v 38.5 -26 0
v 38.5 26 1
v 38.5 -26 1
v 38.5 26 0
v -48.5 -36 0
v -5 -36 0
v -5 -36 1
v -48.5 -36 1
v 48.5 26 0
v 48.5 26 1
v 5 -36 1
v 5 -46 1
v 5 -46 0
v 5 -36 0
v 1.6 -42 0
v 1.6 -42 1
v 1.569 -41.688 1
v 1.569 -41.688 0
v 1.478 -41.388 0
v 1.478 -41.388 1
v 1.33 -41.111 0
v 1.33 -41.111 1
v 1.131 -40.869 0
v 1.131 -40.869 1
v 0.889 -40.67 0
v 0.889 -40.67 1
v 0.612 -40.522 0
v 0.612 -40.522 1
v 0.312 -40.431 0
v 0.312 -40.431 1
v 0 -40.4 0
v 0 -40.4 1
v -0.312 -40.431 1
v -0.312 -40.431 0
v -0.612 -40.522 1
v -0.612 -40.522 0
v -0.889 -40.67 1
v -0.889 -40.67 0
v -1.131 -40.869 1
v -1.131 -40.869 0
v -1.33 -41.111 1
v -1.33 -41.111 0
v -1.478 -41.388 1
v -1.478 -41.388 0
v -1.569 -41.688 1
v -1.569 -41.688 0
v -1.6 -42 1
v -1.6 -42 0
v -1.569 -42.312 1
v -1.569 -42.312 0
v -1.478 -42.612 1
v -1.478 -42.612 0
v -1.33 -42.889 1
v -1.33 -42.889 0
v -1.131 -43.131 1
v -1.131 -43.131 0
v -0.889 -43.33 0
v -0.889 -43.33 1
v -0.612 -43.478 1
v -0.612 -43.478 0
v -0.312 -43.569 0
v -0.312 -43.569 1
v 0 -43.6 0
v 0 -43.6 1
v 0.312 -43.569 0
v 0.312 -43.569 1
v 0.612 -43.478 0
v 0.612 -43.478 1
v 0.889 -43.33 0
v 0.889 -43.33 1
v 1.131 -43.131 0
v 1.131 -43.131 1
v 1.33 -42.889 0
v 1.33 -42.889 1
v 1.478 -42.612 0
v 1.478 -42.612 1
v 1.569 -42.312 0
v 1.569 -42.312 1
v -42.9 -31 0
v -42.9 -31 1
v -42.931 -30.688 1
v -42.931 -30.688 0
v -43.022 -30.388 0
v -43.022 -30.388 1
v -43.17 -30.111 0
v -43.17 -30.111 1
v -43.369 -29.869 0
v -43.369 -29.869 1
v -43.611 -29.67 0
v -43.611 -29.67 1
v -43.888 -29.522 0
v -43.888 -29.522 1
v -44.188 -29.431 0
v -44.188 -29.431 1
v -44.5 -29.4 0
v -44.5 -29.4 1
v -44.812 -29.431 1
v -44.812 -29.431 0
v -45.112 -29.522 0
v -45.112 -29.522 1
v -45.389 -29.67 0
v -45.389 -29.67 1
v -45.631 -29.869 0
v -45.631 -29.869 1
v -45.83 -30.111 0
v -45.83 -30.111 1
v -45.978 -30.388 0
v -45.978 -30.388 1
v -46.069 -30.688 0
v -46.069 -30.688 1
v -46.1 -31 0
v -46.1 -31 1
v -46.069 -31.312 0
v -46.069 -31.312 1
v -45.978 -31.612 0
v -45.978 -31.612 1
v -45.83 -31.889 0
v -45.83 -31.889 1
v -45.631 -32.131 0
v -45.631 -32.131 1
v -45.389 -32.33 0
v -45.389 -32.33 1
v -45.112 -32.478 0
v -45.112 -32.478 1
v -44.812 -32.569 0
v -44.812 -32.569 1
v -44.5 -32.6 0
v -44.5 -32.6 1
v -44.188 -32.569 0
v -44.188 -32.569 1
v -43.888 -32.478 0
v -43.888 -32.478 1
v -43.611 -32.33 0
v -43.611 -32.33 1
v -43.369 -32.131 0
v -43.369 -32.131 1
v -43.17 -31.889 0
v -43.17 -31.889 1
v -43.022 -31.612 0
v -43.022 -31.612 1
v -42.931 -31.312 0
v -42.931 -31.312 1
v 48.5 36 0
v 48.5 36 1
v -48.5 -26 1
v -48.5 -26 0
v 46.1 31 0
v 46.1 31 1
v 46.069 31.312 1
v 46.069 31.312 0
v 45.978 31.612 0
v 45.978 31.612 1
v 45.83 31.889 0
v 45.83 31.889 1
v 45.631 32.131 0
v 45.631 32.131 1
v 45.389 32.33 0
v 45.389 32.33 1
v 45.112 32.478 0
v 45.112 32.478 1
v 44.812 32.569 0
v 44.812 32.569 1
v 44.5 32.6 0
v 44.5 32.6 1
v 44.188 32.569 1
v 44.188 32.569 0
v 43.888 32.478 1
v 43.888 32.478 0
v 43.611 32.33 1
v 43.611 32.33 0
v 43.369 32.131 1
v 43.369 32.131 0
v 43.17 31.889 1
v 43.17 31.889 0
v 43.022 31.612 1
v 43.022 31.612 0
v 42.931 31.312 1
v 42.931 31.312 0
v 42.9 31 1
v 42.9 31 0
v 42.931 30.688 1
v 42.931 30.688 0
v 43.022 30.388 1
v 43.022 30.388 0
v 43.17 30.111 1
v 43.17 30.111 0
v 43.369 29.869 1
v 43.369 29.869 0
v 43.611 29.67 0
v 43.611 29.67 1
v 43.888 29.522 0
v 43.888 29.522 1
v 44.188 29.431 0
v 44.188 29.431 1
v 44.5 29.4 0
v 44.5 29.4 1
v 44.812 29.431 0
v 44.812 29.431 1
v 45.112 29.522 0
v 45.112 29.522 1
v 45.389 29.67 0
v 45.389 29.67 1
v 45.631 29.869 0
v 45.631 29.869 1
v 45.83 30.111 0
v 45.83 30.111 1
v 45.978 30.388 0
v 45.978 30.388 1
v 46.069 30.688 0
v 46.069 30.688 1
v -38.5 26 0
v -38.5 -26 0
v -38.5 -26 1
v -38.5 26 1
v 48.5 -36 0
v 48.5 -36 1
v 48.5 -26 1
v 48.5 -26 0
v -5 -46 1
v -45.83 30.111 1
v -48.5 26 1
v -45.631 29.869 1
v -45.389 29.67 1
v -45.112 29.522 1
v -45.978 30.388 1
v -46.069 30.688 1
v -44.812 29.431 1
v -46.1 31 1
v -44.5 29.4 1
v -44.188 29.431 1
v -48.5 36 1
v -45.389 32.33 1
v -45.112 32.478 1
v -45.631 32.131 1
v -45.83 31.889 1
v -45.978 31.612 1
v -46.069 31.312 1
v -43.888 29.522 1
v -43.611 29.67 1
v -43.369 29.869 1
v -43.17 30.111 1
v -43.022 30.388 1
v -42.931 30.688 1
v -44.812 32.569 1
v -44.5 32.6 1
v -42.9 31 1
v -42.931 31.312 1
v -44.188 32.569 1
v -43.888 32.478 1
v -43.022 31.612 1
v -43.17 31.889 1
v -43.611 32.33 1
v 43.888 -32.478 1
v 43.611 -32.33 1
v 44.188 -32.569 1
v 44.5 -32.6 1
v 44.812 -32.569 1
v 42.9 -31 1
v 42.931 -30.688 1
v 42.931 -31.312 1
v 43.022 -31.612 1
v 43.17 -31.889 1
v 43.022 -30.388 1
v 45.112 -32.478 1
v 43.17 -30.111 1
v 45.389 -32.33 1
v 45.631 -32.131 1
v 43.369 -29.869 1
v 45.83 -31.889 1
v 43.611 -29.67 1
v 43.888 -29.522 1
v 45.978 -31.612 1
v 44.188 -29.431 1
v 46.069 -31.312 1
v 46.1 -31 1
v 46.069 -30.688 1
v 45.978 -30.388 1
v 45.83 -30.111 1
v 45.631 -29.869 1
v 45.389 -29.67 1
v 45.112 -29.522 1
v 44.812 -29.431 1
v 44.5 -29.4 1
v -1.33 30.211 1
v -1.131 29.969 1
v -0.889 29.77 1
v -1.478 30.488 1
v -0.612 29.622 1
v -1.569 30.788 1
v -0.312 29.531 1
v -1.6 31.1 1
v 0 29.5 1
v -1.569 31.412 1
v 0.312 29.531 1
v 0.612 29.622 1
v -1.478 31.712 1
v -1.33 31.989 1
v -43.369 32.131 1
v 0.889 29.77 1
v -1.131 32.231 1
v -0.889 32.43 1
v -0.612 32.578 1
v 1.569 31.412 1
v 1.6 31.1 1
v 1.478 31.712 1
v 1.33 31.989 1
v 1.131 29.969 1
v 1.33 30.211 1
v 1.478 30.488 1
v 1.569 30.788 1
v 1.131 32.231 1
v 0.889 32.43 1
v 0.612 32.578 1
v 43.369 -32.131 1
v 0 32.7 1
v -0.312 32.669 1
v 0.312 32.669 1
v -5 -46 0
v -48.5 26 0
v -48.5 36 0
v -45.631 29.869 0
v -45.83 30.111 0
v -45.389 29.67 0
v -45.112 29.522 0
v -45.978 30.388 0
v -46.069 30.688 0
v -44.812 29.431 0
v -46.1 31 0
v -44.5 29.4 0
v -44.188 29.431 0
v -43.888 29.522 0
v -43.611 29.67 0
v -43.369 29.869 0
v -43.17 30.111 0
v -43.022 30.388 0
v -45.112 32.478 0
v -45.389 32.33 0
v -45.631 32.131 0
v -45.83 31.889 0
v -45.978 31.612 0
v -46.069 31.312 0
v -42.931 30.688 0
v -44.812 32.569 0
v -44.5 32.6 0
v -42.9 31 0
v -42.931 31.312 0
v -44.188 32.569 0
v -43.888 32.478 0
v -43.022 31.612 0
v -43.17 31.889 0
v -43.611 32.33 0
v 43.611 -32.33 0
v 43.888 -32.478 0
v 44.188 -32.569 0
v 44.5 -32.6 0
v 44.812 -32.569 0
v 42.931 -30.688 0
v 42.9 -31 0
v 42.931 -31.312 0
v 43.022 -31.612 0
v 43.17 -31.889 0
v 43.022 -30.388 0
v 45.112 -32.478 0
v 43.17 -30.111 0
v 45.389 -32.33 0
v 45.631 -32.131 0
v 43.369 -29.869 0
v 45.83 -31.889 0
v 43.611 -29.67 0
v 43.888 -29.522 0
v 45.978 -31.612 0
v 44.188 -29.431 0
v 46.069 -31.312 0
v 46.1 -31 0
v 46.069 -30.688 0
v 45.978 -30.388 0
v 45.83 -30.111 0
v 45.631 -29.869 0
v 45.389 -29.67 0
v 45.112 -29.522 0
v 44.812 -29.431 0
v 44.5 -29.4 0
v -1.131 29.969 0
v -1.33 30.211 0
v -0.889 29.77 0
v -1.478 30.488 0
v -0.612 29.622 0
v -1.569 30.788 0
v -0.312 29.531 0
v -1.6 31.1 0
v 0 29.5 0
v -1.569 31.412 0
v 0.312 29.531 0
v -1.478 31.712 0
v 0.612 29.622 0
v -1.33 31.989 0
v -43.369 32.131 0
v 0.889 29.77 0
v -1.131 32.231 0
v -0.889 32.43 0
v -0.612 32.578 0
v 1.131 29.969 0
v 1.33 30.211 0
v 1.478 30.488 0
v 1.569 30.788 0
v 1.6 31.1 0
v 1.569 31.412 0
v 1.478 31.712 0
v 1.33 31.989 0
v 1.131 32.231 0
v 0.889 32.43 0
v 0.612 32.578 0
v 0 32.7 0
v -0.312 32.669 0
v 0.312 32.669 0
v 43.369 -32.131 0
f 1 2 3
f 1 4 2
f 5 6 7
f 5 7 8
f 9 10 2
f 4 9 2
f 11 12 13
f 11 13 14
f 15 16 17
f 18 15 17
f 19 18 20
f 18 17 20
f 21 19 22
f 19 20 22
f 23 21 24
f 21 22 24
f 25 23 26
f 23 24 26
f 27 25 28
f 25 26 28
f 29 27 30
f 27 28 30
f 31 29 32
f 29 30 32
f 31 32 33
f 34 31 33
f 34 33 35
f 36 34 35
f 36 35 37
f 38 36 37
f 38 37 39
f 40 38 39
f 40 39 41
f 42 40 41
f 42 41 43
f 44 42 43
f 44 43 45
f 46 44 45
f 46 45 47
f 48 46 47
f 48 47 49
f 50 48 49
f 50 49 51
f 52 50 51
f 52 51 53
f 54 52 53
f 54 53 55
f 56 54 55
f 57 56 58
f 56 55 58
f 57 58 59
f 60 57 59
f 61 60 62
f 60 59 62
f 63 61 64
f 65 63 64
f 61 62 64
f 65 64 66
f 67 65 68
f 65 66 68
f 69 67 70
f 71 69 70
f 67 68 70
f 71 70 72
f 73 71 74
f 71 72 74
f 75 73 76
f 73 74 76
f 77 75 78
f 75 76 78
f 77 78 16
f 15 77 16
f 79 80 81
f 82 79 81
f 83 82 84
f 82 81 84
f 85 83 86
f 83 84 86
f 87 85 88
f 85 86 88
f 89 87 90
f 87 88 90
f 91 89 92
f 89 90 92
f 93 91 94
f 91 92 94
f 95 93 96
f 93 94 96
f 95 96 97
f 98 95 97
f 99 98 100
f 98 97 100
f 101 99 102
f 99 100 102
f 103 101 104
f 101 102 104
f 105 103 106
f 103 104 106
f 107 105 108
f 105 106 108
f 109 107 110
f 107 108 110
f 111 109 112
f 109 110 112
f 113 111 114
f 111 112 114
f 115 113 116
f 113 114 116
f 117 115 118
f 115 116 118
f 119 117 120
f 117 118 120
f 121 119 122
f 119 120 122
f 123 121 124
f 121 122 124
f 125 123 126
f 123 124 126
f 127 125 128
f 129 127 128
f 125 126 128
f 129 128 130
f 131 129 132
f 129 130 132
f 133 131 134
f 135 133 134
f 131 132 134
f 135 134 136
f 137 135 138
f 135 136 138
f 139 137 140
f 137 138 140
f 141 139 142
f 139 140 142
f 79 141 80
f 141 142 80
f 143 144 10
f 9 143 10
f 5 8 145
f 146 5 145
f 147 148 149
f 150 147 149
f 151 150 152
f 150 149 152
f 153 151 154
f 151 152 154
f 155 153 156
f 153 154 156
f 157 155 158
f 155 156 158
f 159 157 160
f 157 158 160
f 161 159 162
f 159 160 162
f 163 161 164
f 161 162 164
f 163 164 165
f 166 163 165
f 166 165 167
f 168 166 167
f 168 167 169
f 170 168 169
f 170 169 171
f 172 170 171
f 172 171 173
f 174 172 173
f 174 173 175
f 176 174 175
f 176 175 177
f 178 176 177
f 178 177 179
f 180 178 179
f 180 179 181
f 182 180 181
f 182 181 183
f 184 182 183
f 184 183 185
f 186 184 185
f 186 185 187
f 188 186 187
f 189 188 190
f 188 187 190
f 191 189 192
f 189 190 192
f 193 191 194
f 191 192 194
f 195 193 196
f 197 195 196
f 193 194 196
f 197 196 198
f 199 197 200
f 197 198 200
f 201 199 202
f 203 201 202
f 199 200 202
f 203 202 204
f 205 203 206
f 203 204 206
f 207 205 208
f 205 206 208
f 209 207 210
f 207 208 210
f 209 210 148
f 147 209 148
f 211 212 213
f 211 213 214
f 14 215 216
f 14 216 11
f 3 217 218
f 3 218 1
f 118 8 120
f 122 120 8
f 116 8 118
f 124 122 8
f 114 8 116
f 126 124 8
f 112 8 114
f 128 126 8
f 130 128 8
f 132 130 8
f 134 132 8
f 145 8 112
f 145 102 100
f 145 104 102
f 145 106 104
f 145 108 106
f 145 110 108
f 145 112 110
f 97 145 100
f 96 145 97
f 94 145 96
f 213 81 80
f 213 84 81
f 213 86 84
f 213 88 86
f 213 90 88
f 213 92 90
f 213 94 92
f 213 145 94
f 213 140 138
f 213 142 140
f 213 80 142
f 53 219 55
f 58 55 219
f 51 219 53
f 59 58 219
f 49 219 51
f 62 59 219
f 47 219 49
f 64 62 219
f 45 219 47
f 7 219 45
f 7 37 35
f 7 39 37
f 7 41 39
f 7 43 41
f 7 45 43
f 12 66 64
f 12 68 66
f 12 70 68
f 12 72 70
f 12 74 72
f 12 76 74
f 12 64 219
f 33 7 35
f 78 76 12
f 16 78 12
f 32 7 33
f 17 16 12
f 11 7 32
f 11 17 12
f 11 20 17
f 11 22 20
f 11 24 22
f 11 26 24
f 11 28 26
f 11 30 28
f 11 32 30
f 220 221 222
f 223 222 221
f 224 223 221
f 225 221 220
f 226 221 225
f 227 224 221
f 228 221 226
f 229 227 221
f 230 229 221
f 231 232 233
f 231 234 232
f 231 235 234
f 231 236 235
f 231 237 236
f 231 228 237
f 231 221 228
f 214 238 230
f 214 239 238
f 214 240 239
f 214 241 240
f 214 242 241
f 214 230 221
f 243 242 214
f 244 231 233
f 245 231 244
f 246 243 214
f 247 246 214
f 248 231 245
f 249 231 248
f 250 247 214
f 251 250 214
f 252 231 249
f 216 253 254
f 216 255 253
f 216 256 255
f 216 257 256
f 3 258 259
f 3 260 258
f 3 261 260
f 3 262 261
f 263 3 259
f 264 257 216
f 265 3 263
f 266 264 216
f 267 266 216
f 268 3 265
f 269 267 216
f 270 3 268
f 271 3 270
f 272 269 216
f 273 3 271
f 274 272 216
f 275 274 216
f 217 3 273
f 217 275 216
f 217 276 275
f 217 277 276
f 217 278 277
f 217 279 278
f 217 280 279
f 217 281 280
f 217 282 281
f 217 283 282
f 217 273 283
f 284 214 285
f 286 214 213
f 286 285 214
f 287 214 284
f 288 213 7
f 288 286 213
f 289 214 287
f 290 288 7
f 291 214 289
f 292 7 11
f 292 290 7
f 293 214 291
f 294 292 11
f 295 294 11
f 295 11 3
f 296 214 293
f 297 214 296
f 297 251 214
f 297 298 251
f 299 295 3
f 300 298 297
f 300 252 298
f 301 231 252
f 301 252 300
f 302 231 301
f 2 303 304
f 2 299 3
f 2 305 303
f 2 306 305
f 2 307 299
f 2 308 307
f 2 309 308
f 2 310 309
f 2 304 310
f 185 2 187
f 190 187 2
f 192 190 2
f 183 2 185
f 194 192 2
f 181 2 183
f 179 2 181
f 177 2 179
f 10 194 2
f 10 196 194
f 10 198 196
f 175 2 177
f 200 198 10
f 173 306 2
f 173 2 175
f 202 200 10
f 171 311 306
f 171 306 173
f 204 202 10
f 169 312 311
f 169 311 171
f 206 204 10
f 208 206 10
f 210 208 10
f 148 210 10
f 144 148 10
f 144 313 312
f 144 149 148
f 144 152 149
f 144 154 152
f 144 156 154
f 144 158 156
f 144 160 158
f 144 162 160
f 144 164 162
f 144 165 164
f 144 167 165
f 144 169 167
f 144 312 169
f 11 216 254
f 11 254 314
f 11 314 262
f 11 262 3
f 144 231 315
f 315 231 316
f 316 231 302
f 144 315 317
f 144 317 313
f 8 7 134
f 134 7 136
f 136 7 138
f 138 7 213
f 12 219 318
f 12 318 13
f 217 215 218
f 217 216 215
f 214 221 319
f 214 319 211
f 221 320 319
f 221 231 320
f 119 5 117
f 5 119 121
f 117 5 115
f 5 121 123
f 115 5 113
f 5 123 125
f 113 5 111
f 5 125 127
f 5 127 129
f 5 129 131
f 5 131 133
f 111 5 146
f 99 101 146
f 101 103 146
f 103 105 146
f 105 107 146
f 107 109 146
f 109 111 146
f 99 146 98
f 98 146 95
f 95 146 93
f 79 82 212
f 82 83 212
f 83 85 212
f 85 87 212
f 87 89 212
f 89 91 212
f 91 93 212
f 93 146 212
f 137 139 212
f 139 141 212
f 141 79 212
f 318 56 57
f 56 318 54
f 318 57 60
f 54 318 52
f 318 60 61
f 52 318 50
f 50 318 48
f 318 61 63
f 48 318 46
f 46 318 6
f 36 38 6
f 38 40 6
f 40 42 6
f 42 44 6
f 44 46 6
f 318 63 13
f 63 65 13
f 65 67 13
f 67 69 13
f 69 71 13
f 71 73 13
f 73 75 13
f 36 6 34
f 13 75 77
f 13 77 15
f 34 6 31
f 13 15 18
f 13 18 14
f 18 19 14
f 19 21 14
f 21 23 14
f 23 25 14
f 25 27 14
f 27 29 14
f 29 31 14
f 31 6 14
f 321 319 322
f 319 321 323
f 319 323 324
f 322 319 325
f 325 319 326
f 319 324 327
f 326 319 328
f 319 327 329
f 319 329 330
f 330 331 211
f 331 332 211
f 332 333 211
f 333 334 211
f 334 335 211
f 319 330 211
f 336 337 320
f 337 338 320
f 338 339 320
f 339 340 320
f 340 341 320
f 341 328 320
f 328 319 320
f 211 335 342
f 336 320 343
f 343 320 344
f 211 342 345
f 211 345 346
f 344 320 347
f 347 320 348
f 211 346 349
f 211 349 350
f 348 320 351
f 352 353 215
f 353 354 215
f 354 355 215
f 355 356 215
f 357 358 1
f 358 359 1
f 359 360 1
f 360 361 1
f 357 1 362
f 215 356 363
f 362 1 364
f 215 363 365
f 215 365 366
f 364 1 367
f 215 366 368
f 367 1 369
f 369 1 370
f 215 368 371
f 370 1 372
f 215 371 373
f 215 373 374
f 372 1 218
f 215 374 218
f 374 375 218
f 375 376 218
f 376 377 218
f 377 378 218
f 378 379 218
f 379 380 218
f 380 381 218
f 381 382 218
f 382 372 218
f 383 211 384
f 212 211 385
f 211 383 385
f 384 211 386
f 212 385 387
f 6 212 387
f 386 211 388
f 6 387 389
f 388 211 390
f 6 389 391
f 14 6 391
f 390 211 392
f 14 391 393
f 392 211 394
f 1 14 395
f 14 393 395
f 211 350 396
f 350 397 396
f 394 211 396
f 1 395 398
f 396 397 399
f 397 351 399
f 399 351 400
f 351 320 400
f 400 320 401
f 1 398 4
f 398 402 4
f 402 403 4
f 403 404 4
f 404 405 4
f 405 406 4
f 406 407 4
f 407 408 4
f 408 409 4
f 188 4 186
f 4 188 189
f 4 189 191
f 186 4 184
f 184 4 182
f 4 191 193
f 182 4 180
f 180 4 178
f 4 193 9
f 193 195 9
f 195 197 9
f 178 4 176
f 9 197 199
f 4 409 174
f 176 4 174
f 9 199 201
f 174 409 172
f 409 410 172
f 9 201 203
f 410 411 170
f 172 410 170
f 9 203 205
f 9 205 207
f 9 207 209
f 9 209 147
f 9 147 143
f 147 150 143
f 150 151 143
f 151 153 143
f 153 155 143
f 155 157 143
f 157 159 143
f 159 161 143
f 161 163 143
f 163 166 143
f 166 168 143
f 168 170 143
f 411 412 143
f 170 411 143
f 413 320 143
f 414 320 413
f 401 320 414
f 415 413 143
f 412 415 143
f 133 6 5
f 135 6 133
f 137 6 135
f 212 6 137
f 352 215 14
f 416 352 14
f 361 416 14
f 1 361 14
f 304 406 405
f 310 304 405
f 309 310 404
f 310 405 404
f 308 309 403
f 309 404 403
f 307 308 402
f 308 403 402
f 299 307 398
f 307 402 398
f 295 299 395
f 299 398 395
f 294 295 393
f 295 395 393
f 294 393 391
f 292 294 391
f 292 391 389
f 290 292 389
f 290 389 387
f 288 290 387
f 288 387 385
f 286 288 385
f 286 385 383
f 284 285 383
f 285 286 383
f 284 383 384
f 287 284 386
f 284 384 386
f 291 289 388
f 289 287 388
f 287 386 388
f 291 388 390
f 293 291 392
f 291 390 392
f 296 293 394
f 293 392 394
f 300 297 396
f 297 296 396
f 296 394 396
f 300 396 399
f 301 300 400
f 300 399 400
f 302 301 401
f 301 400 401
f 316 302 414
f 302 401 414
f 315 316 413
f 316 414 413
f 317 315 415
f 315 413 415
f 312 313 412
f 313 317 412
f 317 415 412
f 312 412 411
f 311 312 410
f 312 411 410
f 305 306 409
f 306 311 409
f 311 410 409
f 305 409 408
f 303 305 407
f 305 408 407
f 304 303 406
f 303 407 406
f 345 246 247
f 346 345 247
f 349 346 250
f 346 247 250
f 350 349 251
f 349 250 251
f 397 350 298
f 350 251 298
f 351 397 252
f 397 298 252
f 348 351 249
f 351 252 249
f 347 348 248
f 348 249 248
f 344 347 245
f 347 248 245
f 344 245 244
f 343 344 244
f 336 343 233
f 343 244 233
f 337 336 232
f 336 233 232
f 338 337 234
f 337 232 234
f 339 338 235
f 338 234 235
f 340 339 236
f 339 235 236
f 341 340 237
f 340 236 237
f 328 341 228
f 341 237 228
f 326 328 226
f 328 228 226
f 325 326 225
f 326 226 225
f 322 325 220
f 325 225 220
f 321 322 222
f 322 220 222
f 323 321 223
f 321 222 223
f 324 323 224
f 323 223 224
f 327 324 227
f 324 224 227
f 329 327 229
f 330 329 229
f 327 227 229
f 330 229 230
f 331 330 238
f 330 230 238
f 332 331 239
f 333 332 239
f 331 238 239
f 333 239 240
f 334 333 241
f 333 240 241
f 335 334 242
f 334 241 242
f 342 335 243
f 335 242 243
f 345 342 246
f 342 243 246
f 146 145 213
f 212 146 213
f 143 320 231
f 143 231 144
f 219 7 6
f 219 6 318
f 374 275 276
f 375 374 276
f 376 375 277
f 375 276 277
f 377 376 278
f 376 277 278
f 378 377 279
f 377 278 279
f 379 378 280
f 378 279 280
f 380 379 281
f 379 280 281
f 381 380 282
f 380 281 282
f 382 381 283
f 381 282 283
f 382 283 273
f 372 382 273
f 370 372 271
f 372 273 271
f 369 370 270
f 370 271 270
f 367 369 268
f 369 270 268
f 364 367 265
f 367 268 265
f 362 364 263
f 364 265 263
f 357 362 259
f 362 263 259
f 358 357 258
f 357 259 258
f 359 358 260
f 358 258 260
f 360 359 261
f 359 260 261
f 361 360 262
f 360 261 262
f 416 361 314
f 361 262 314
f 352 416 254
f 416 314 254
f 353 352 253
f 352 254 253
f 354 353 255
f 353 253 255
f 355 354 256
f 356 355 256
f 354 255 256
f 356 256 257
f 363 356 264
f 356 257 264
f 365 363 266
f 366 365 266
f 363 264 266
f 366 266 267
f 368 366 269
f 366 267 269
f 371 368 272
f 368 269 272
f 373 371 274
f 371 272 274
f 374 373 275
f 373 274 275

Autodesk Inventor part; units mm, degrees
ref_plane "YZ Plane" through (0, 0, 0) normal (1, 0, 0) x (0, 1, 0)
ref_plane "XZ Plane" through (0, 0, 0) normal (0, 1, 0) x (-1, 0, 0)
ref_plane "XY Plane" through (0, 0, 0) normal (0, 0, 1) x (1, 0, 0)
sketch "Sketch1" plane through (0, 0, 0) normal (0, 0, 1) x (1, 0, 0)
  line L0 (-38.5, 36) -> (38.5, 36)
  line L1 (38.5, 36) -> (38.5, -36)
  line L2 (38.5, -36) -> (-38.5, -36)
  line L3 (-38.5, -36) -> (-38.5, 36)
  line L4 (-38.5, 36) -> (38.5, -36) construction
  line L5 (38.5, 36) -> (-38.5, -36) construction
  circle A0 centre (0, 31.1) radius 1.6
  point P0 (0, 0)
  dimension "d0" = 72
  dimension "d1" = 77
  dimension "d24" = 3.2
  dimension "d25" = 4.9
sketch "Sketch2" plane through (0, 0, 1) normal (0, 0, 1) x (1, 0, 0)
  line L0 (-38.5, 36) -> (38.5, 36)
  line L1 (-48.5, 26) -> (-38.5, 26)
  line L2 (-38.5, 26) -> (-38.5, 36)
  line L3 (-38.5, 36) -> (-48.5, 36)
  line L4 (-48.5, 36) -> (-48.5, 26)
  line L5 (-48.5, 26) -> (-38.5, 36) construction
  line L6 (-38.5, 26) -> (-48.5, 36) construction
  line L7 (0, 0) -> (0, 7.0571)
  line L8 (0, 0) -> (6.6312, 0)
  line L9 (-38.5, -36) -> (-38.5, 36)
  line L10 (48.5, 26) -> (38.5, 26)
  line L11 (38.5, 26) -> (38.5, 36)
  line L12 (38.5, 36) -> (48.5, 36)
  line L13 (48.5, 36) -> (48.5, 26)
  line L14 (48.5, 26) -> (38.5, 36) construction
  line L15 (38.5, 26) -> (48.5, 36) construction
  circle A0 centre (-44.5, 31) radius 1.6
  circle A1 centre (44.5, 31) radius 1.6
  line L16 (38.5, -36) -> (-38.5, -36)
  line L17 (-5, -46) -> (5, -46)
  line L18 (5, -46) -> (5, -36)
  line L19 (5, -36) -> (-5, -36)
  line L20 (-5, -36) -> (-5, -46)
  line L21 (-5, -46) -> (5, -36) construction
  line L22 (5, -46) -> (-5, -36) construction
  circle A2 centre (0, -42) radius 1.6
  line L23 (-48.5, -26) -> (-38.5, -26)
  line L24 (-38.5, -26) -> (-38.5, -36)
  line L25 (-38.5, -36) -> (-48.5, -36)
  line L26 (-48.5, -36) -> (-48.5, -26)
  line L27 (-48.5, -26) -> (-38.5, -36) construction
  line L28 (-38.5, -26) -> (-48.5, -36) construction
  line L29 (38.5, -26) -> (38.5, -36)
  line L30 (38.5, -36) -> (48.5, -36)
  line L31 (48.5, -36) -> (48.5, -26)
  line L32 (48.5, -26) -> (38.5, -36) construction
  line L33 (38.5, -26) -> (48.5, -36) construction
  line L34 (48.5, -26) -> (38.5, -26)
  circle A3 centre (-44.5, -31) radius 1.6
  circle A4 centre (44.5, -31) radius 1.6
  point P0 (-43.5, 31)
  point P1 (43.5, 31)
  point P2 (0, -41)
  point P3 (-38.5, -36)
  point P4 (-43.5, -31)
  point P5 (43.5, -31)
  dimension "d5" = 10
  dimension "d6" = 10
  dimension "d10" = 3.2
  dimension "d12" = 4
  dimension "d18" = 3.2
  dimension "d19" = 10
  dimension "d20" = 10
  dimension "d21" = 4
  dimension "d22" = 5
extrude "Plate1" add sketch "Sketch1" along normal blind 1
sheet face with bend "Face2" sketch "Sketch2" thickness 1 toward (0, 0, -1) bend radius 1
bend "Bend1"
equation "\"d2\" = 厚度"
equation "\"d13\" = 折彎半徑"
equation "\"d14\" = 折彎離隙寬度"
equation "\"d16\" = 最小剩餘"
equation "\"d15\" = 折彎離隙深度"
equation "\"d17\" = 轉移半徑"
equation "\"折彎半徑\" = 厚度"
equation "\"折彎離隙寬度\" = 厚度"
equation "\"折彎離隙深度\" = 0.5 * 厚度"
equation "\"轉角離隙大小\" = 4 * 厚度"
equation "\"最小剩餘\" = 2 * 厚度"
equation "\"轉移半徑\" = 折彎半徑"
equation "\"Jacobi半徑大小\" = 折彎半徑"
equation "\"間隙大小\" = 厚度"
equation "\"厚度\" = 1"
properties part number "battery_box_24V_base" material "Aluminum"
